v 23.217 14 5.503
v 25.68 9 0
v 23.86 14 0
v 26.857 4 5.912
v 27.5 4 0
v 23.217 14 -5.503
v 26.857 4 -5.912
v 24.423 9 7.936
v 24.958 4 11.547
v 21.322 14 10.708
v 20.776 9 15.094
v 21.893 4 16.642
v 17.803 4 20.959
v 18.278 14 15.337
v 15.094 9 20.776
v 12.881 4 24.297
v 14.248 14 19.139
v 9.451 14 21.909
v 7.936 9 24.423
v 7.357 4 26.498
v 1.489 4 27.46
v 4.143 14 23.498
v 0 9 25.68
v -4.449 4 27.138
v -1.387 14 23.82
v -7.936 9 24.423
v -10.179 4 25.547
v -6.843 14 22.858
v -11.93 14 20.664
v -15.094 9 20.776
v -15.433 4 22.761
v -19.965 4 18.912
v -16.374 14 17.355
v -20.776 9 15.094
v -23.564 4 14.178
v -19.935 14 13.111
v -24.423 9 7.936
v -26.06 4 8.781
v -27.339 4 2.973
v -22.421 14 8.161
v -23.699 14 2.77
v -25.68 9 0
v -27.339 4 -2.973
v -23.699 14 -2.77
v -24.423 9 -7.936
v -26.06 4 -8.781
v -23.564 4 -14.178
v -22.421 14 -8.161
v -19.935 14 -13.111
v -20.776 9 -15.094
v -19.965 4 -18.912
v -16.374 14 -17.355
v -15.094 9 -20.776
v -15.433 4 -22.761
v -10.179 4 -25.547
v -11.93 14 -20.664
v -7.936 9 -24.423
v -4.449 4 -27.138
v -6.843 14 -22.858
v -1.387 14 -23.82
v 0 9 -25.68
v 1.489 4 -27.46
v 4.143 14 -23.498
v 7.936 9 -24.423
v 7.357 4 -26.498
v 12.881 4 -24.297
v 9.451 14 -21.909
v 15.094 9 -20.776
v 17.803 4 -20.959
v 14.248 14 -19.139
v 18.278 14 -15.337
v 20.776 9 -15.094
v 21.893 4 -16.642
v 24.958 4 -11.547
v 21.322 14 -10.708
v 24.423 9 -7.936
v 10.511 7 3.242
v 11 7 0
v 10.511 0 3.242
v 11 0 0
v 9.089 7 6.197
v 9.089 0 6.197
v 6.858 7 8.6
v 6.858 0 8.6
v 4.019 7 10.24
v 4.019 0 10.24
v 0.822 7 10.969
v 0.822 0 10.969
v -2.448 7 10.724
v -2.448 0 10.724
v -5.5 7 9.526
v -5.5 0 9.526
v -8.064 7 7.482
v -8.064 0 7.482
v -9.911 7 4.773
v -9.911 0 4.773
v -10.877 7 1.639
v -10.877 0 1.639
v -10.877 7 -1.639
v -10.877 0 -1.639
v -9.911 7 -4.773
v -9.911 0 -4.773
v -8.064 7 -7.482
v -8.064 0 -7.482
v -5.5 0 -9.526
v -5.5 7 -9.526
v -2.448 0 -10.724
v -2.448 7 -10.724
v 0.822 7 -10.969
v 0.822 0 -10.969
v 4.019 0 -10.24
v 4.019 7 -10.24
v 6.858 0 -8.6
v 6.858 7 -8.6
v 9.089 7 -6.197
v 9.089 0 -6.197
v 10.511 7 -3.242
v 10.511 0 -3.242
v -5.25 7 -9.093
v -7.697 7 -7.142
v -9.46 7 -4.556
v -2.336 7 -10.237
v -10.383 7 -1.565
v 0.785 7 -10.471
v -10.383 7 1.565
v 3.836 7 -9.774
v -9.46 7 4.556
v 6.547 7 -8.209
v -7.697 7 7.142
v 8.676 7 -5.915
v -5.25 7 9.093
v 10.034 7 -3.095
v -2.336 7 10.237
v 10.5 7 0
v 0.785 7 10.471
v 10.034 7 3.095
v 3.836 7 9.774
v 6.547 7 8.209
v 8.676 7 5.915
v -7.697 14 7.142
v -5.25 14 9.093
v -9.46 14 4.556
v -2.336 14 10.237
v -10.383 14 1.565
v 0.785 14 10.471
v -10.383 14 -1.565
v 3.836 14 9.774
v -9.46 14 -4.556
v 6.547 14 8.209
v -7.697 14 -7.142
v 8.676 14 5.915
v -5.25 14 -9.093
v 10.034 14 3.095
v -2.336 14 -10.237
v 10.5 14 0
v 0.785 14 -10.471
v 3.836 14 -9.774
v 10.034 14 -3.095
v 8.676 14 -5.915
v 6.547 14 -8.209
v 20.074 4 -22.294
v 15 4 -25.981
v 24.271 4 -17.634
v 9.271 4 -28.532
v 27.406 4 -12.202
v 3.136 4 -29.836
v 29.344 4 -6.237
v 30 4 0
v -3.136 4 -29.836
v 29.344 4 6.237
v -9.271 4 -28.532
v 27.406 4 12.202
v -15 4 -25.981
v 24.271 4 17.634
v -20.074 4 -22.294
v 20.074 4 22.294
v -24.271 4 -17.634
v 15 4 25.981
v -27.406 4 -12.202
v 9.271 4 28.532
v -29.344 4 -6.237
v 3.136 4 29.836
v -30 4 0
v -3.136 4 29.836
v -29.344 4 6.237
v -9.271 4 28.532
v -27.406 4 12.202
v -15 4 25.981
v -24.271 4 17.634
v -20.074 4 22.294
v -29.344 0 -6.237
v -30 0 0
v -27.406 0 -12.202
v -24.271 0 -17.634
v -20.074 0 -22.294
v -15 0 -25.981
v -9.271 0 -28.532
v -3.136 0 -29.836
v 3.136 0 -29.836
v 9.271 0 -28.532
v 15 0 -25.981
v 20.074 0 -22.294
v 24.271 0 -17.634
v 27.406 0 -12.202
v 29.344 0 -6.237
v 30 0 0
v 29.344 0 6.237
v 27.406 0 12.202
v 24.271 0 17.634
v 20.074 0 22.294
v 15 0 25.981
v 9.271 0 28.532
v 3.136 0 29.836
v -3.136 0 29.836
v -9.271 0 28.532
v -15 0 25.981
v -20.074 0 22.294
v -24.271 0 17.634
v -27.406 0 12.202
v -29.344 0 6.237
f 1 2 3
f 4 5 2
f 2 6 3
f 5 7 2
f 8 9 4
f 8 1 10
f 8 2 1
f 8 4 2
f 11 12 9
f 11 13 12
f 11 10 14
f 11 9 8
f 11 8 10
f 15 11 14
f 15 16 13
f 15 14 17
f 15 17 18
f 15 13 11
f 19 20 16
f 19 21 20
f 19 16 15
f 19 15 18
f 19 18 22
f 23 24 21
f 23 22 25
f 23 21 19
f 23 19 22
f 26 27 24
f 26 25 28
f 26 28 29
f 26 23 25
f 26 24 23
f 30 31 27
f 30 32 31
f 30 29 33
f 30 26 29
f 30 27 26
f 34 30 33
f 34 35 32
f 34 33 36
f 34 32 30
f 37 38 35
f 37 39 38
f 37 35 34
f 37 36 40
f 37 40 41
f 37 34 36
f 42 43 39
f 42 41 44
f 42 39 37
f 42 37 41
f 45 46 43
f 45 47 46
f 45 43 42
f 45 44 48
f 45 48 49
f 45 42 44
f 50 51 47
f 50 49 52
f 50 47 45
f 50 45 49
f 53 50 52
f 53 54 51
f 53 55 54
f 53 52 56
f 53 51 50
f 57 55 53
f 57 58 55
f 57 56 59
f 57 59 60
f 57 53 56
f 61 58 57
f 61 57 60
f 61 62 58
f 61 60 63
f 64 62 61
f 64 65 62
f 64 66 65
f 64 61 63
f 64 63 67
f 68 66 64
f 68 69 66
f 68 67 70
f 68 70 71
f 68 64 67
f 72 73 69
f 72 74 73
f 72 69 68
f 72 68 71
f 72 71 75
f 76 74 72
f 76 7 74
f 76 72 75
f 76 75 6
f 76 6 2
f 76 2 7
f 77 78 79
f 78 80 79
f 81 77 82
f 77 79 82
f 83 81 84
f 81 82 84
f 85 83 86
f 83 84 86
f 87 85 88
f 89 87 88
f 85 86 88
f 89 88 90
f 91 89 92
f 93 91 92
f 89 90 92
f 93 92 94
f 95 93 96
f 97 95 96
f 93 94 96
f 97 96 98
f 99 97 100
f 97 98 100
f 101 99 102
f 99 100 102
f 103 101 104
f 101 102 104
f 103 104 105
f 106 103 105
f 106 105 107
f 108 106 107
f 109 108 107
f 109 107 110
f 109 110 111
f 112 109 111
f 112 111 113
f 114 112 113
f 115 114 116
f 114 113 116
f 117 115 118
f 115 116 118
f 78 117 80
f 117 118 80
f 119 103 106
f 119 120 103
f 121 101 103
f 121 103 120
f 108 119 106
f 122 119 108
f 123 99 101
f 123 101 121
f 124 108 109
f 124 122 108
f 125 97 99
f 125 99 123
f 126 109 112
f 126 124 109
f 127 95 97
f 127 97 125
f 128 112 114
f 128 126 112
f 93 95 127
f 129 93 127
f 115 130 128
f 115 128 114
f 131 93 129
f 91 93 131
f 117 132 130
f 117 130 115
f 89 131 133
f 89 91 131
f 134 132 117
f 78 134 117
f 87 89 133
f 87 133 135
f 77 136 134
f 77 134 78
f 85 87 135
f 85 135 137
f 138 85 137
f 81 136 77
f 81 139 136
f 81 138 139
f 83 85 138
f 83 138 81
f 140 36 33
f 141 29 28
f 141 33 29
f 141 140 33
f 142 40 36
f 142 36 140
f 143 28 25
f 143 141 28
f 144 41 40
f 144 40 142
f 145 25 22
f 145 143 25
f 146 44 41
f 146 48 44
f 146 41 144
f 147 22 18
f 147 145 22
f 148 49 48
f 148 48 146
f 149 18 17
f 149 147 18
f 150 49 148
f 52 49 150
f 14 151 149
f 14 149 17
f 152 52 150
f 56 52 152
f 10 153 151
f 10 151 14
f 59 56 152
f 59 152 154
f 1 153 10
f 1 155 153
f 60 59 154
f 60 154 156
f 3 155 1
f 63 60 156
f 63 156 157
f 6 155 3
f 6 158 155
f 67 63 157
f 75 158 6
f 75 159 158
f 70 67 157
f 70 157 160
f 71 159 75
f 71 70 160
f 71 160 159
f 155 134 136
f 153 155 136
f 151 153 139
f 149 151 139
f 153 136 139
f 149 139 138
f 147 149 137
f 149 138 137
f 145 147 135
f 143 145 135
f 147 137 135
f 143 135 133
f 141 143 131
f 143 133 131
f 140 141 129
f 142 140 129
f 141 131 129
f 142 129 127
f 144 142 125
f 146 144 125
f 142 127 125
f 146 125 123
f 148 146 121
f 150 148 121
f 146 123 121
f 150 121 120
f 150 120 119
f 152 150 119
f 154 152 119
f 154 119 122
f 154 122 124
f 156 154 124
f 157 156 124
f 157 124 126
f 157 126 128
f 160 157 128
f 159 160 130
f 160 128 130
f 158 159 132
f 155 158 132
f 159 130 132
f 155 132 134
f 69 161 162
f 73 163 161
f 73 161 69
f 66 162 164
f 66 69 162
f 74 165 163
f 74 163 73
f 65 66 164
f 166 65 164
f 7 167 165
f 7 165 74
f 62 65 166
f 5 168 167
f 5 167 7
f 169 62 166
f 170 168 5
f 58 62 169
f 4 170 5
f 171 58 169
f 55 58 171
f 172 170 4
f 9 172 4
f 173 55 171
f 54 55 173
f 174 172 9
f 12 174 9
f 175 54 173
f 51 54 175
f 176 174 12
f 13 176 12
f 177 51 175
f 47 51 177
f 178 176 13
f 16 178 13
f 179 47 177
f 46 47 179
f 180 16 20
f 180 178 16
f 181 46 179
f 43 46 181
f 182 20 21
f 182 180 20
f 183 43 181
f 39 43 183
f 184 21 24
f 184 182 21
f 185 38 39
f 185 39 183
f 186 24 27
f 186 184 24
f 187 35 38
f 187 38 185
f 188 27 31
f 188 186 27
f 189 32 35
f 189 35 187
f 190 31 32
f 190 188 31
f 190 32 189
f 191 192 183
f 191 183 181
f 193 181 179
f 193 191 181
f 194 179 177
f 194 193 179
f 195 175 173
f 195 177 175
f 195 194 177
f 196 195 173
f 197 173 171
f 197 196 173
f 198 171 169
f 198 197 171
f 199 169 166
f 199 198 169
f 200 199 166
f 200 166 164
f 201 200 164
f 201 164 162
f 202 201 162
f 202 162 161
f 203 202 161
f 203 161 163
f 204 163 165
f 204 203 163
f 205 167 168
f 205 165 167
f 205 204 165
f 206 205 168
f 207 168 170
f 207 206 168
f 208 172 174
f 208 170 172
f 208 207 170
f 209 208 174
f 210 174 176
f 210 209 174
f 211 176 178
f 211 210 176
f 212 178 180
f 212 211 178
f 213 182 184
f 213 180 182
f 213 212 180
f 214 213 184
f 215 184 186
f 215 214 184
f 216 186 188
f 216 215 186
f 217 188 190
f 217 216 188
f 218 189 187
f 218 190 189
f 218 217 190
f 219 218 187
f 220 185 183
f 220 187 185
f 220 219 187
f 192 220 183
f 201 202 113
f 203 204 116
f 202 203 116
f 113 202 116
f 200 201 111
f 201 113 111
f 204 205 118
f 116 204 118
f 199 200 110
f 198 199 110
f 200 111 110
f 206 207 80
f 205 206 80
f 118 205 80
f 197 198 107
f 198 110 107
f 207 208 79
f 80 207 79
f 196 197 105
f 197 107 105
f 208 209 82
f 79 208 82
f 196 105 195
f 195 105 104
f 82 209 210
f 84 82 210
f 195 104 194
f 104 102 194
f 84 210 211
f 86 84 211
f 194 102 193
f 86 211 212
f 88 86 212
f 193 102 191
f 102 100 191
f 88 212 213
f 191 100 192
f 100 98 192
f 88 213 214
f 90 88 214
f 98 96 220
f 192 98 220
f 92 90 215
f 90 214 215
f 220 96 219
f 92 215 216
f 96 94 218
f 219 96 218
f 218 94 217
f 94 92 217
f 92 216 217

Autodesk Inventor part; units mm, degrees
ref_plane "YZ Plane" through (0, 0, 0) normal (1, 0, 0) x (0, 1, 0)
ref_plane "XZ Plane" through (0, 0, 0) normal (0, 1, 0) x (-1, 0, 0)
ref_plane "XY Plane" through (0, 0, 0) normal (0, 0, 1) x (1, 0, 0)
sketch "Sketch1" plane through (0, 0, 0) normal (0, 1, 0) x (-1, 0, 0)
  circle A0 centre (0, 0) radius 30
  dimension "d0" = 60
extrude "Extrusion1" add sketch "Sketch1" along normal blind 4
sketch "Sketch2" plane through (0, 4, 0) normal (0, 1, 0) x (1, 0, 0)
  circle A0 centre (0, 0) radius 27.5
  dimension "d3" = 55
extrude "Extrusion2" add sketch "Sketch2" along normal blind 10 draft -20
sketch "Sketch3" plane through (0, 14, 0) normal (0, 1, 0) x (1, 0, 0)
  circle A0 centre (0, 0) radius 4
  dimension "d6" = 8
extrude "Extrusion3" cut sketch "Sketch3" against normal blind 16
sketch "Sketch4" plane through (0, 0, 0) normal (0, -1, 0) x (1, 0, 0)
  circle A0 centre (0, 0) radius 11
  dimension "d9" = 22
extrude "Extrusion4" cut sketch "Sketch4" against normal blind 7
sketch "Sketch5" plane through (0, 7, 0) normal (0, -1, 0) x (1, 0, 0)
  circle A0 centre (0, 0) radius 10.5
  dimension "d12" = 21
extrude "Extrusion5" cut sketch "Sketch5" against normal blind 17
properties part number "spool holder"
